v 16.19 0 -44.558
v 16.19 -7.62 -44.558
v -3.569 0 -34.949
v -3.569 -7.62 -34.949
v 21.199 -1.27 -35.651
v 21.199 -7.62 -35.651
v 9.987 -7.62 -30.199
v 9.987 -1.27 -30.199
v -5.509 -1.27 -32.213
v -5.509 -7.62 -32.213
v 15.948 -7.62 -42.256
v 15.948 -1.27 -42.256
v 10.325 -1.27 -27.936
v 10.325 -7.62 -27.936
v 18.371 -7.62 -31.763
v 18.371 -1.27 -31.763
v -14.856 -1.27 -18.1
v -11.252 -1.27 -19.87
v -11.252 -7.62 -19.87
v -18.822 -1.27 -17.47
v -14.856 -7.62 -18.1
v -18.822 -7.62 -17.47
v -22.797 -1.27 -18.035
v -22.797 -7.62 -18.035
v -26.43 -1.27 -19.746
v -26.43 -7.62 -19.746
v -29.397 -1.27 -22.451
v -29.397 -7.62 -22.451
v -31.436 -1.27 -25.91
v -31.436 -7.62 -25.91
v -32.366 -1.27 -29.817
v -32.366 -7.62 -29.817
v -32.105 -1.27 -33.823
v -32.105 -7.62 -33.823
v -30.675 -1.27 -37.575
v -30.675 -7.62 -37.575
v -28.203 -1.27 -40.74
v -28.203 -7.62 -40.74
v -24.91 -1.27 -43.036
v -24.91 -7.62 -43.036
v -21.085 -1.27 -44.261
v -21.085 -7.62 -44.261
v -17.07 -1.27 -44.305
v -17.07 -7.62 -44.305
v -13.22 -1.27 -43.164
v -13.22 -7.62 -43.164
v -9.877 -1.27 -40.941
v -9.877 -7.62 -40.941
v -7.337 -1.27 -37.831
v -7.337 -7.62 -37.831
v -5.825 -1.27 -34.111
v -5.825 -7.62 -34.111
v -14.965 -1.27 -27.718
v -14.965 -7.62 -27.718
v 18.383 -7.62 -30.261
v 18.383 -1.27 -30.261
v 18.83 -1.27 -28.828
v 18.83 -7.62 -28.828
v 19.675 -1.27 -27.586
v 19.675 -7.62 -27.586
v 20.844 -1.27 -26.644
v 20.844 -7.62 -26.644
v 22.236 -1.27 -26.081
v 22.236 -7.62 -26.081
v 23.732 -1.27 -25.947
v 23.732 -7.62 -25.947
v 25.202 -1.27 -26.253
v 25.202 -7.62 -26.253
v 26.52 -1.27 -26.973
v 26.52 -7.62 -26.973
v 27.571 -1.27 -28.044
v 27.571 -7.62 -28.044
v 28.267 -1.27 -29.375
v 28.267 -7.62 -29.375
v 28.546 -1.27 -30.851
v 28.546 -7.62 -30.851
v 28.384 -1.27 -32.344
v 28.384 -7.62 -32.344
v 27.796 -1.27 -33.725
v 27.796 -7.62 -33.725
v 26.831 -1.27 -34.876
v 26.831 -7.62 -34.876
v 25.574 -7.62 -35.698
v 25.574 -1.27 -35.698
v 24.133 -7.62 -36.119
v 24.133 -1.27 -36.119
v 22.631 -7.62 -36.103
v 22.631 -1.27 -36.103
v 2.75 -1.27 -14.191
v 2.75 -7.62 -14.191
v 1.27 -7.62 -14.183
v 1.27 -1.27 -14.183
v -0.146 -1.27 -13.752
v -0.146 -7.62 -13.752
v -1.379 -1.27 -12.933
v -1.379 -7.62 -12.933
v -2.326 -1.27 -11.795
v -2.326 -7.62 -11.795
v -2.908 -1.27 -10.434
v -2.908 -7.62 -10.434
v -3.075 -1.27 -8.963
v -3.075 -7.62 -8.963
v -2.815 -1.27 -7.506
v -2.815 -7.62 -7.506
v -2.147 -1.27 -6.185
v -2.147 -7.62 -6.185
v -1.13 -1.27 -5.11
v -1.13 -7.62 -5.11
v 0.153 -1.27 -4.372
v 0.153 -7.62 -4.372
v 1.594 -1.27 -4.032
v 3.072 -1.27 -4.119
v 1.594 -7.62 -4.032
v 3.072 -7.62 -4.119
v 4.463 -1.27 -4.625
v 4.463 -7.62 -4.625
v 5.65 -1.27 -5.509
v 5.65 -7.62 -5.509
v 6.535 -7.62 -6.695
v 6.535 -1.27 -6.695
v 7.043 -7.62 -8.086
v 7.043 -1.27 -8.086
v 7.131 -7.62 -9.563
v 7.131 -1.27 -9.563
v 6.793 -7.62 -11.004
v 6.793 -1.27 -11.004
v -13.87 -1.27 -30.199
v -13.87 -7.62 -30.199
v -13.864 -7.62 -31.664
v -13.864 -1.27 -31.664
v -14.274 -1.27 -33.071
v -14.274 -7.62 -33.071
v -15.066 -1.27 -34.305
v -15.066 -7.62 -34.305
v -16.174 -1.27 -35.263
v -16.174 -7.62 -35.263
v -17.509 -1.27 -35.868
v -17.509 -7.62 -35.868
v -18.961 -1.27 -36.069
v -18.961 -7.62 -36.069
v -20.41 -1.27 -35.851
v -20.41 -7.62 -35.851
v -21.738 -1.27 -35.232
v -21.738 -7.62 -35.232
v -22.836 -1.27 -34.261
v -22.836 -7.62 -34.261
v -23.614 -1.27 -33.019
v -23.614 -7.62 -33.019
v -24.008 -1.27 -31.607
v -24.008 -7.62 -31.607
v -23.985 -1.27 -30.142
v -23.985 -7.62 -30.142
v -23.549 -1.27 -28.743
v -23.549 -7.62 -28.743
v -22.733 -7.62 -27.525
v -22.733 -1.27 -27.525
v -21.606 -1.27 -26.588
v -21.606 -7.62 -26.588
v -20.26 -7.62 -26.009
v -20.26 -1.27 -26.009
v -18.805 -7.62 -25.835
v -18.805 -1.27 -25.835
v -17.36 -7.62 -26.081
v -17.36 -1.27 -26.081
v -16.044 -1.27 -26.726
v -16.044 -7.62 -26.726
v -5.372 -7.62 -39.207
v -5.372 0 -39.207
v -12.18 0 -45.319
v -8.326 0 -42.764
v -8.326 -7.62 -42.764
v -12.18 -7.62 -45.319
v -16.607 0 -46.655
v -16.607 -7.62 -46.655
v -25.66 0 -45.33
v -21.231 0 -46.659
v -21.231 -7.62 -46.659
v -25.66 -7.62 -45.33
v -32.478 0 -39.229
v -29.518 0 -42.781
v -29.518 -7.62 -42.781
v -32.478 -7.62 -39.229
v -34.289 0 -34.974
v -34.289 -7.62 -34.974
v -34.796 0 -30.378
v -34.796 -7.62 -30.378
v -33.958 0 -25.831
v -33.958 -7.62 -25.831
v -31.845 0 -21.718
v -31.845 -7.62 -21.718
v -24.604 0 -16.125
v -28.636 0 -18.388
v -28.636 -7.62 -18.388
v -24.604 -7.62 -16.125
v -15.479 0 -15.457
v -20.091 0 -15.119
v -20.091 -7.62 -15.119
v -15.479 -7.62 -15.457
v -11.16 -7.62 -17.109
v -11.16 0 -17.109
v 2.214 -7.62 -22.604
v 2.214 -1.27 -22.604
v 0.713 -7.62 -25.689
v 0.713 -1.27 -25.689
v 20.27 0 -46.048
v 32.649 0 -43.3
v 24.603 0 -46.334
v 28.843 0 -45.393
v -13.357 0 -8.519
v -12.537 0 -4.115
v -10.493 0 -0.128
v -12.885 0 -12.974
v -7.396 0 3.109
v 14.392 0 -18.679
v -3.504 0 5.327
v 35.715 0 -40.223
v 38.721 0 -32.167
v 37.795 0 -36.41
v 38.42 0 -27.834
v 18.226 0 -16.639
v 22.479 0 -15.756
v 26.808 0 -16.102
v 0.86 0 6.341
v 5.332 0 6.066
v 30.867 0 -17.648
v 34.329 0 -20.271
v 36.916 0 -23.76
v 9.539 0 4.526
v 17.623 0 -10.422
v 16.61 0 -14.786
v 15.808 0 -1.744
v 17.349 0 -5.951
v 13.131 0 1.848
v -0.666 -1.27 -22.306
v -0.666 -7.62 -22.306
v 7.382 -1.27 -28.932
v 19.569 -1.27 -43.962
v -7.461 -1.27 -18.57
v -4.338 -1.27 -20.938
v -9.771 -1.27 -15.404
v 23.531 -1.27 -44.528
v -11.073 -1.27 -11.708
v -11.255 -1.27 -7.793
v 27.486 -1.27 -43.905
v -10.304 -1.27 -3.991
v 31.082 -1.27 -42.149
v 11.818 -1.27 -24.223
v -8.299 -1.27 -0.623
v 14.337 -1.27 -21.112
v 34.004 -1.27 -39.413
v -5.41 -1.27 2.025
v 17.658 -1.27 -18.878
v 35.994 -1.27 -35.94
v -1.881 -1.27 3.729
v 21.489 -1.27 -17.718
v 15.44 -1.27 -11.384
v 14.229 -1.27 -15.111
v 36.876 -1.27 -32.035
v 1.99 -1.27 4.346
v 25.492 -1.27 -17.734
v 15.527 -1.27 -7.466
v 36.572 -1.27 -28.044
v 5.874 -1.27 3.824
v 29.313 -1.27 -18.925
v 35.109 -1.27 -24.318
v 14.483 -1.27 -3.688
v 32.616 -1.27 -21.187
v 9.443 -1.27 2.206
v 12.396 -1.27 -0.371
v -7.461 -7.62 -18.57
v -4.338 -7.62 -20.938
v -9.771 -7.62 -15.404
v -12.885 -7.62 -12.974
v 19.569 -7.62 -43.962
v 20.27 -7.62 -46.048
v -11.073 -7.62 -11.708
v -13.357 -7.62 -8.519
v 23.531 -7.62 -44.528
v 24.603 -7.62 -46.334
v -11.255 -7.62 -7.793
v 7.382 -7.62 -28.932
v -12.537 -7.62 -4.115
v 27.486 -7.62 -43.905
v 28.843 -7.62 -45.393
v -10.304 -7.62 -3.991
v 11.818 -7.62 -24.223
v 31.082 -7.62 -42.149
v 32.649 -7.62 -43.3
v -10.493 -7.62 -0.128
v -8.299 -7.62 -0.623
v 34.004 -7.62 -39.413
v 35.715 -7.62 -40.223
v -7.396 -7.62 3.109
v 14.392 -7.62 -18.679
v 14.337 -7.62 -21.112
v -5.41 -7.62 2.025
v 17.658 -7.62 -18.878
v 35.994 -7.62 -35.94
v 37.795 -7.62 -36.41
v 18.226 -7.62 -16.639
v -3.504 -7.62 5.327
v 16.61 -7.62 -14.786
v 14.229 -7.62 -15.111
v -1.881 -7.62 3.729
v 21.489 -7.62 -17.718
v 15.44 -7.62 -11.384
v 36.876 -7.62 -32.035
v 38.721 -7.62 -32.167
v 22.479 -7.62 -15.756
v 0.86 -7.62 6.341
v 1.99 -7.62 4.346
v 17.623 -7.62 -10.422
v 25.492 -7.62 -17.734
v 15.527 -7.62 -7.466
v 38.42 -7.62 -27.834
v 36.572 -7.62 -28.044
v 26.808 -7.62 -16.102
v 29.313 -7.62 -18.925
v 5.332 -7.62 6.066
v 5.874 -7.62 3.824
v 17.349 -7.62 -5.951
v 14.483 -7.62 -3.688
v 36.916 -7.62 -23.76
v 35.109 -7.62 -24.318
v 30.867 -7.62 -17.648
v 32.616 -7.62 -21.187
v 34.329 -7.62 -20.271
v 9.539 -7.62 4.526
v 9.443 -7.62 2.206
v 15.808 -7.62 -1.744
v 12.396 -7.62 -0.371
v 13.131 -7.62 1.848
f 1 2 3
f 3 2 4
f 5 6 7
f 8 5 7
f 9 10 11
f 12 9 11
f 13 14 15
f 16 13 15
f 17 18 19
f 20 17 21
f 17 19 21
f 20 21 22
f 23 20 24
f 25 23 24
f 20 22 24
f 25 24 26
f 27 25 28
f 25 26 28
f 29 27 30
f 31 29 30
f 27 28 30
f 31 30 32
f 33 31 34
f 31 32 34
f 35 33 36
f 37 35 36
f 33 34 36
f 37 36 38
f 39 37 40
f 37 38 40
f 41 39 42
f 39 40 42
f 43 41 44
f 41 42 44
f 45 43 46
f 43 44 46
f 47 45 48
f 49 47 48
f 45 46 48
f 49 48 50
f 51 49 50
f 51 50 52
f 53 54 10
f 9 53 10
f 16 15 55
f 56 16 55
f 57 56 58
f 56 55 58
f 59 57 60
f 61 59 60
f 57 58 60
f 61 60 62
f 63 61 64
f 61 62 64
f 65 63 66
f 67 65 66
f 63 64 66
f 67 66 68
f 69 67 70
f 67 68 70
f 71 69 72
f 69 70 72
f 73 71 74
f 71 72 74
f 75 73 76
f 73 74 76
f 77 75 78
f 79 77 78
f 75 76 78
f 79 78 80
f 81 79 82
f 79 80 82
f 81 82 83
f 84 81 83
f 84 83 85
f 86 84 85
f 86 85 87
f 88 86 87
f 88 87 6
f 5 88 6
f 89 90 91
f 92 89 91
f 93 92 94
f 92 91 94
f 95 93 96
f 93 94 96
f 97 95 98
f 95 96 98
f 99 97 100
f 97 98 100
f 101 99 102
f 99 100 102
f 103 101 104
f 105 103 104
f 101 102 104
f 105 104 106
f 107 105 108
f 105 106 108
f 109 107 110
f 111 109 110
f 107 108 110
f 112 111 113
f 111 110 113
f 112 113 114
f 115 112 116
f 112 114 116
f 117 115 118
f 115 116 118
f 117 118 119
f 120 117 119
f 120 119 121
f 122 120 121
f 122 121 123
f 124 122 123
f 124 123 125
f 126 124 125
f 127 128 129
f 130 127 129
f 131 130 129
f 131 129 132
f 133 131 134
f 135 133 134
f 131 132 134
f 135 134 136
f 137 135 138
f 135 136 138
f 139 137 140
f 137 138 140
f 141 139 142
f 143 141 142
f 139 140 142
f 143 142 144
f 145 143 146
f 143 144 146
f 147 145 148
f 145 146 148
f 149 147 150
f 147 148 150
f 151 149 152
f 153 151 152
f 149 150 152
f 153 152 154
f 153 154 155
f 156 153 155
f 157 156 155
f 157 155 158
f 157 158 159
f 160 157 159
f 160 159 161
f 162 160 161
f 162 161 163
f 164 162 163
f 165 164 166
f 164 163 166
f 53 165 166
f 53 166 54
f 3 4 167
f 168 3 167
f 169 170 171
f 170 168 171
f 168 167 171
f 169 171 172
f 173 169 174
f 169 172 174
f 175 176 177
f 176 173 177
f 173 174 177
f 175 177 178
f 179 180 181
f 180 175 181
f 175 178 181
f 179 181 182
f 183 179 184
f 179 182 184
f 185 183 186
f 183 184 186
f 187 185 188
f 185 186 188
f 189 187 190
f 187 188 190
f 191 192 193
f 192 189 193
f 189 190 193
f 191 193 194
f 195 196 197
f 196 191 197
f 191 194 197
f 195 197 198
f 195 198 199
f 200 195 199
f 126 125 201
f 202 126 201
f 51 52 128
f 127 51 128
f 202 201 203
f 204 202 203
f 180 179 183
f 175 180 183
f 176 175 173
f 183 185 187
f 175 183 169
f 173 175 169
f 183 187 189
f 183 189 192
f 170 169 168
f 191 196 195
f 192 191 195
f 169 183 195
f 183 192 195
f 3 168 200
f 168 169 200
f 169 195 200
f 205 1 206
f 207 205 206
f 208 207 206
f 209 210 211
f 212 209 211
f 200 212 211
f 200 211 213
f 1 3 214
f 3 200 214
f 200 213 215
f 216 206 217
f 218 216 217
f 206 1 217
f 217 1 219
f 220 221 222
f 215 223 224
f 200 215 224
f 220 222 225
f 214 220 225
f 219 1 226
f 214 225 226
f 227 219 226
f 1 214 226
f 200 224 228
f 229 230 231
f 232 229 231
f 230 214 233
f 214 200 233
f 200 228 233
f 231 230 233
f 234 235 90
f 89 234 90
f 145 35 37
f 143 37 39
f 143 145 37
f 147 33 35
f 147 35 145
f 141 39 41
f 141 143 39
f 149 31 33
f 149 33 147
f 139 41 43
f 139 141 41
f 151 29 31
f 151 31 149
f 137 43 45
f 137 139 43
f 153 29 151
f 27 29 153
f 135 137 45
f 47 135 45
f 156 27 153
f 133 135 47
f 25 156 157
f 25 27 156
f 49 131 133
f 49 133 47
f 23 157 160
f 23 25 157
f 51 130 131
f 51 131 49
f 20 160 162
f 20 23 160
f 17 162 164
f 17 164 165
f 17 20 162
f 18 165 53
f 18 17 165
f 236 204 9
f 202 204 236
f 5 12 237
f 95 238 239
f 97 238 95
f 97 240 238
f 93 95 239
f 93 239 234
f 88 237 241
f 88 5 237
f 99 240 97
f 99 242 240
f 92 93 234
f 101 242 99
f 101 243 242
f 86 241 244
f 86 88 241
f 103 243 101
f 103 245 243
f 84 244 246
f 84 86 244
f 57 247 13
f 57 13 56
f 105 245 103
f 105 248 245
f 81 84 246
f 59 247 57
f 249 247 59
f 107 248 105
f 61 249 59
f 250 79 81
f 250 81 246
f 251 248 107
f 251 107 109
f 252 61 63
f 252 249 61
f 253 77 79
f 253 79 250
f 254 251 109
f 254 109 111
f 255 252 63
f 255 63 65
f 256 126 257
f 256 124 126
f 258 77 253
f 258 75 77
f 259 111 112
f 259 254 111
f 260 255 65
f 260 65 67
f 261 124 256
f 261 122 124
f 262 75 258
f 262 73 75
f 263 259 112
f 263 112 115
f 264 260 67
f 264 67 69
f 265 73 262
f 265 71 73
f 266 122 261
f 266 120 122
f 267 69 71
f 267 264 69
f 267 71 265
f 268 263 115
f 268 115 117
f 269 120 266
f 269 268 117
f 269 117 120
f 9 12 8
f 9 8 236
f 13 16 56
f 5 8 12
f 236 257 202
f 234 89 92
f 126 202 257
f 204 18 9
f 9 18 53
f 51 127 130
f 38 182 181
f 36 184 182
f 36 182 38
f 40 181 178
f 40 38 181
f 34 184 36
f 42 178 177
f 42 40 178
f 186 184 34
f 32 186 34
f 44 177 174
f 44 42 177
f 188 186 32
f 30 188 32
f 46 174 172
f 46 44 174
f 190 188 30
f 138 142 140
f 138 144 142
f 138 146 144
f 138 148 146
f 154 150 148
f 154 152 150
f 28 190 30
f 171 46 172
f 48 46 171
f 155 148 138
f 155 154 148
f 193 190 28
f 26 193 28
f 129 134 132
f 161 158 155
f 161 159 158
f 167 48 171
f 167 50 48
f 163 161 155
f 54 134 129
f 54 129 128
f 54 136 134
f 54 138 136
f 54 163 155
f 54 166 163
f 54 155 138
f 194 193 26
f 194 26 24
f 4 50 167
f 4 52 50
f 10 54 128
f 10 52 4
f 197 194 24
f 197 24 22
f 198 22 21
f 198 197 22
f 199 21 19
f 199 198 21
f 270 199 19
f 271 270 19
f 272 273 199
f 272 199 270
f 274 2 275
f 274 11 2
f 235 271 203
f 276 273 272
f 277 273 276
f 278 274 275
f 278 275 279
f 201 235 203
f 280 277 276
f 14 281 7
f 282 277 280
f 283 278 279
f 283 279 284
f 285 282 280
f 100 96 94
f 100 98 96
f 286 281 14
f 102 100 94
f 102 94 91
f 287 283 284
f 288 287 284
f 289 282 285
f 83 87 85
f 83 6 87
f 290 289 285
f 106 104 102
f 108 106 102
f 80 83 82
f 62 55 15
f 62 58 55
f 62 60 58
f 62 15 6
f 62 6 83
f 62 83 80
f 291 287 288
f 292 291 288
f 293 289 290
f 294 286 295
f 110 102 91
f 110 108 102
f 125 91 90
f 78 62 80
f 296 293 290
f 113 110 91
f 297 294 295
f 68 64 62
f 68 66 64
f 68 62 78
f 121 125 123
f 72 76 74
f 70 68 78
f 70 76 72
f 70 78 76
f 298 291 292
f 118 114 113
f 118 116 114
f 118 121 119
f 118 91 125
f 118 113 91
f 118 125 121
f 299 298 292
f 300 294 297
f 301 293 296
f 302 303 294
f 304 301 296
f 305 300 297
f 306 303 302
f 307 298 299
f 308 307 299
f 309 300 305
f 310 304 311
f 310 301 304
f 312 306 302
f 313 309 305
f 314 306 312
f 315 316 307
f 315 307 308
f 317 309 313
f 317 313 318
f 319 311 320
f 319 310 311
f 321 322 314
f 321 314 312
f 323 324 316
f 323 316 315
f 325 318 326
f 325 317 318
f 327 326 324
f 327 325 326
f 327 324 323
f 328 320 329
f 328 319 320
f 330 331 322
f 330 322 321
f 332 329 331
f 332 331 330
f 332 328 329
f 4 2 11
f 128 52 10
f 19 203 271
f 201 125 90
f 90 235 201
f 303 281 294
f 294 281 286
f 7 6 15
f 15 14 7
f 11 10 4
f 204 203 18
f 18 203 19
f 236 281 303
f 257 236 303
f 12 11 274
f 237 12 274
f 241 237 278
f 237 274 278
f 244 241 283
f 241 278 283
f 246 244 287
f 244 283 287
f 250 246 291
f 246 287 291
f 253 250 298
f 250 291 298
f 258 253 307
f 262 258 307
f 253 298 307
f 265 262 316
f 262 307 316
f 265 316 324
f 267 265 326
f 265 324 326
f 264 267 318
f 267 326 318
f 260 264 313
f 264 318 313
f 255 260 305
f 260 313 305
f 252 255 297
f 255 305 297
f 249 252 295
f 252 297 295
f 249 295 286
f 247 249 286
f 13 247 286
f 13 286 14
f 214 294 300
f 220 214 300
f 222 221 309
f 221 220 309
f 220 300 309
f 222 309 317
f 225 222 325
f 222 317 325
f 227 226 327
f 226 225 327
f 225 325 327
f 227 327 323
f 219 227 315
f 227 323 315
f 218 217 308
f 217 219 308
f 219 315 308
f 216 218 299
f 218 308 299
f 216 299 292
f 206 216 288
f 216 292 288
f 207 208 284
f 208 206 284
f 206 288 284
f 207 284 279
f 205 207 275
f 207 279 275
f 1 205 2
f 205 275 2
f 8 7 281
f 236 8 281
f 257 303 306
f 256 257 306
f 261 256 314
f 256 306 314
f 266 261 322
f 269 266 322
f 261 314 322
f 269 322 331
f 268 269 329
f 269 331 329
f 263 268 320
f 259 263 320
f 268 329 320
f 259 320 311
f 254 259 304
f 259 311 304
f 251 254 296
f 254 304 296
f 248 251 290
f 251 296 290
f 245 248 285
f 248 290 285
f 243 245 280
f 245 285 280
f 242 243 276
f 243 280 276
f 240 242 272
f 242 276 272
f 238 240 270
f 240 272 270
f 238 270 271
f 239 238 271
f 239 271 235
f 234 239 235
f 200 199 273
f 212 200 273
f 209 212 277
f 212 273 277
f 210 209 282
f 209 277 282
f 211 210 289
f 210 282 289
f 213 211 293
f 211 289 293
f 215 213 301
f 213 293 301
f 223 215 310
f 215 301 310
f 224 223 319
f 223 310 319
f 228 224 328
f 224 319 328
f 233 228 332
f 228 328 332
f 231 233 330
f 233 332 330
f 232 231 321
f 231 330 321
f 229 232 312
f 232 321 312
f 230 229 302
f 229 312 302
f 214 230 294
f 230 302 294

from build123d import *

# Parameters (mm, degrees)
F0_W     = 76.2
F0_H     = 76.2
F1_DEPTH = 7.62
F3_DEPTH = 6.35
F4_W     = 76.2
F4_H     = 76.2
F5_DEPTH = 25.4


with BuildPart() as f1:
    # F0 (on Front) → F1 (new body)
    with BuildSketch(Plane.XZ):
        with Locations((1.97351, -18.584051)):
            Rectangle(F0_W, F0_H)
    extrude(amount=F1_DEPTH)

    # F2 (on face) → F3 (cut)
    with BuildSketch(Plane.XZ.offset(7.62)):
        with BuildLine():
            ThreePointArc((-13.869856, -30.198783), (-23.613724, -33.018671), (-14.965154, -27.718014))
            Line((-14.965154, -27.718014), (-5.508855, -32.213487))
            Line((-5.508855, -32.213487), (15.947649, -42.256406))
            ThreePointArc((15.947649, -42.256406), (35.979187, -26.126775), (10.324704, -27.936473))
            Line((10.324704, -27.936473), (18.371095, -31.763075))
            ThreePointArc((18.371095, -31.763075), (27.571492, -28.044193), (21.199014, -35.651355))
            Line((21.199014, -35.651355), (9.986617, -30.198783))
            Line((9.986617, -30.198783), (7.381885, -28.932106))
            Line((7.381885, -28.932106), (14.229408, -15.111173))
            ThreePointArc((14.229408, -15.111173), (-3.707419, 3.005858), (-0.665507, -22.30626))
            Line((-0.665507, -22.30626), (2.75023, -14.190622))
            ThreePointArc((2.75023, -14.190622), (-1.129552, -5.110009), (6.792904, -11.004492))
            Line((6.792904, -11.004492), (2.213593, -22.604426))
            Line((2.213593, -22.604426), (0.713445, -25.689254))
            Line((0.713445, -25.689254), (-11.252215, -19.870372))
            ThreePointArc((-11.252215, -19.870372), (-31.530362, -35.752906), (-5.825069, -34.110951))
            Line((-5.825069, -34.110951), (-13.869856, -30.198783))
        make_face()
    extrude(amount=-F3_DEPTH, mode=Mode.SUBTRACT)

    # F4 (on face) → F5 (cut)
    with BuildSketch(Plane.XZ.offset(7.62)):
        with Locations((1.97351, -18.584051)):
            Rectangle(F4_W, F4_H)
        with BuildLine():
            ThreePointArc((-11.160331, -17.109246), (3.105819, 6.365386), (14.391984, -18.678653))
            ThreePointArc((14.391984, -18.678653), (38.724881, -29.989974), (16.189961, -44.557514))
            Line((16.189961, -44.557514), (-3.568678, -34.948918))
            ThreePointArc((-3.568678, -34.948918), (-33.539138, -37.167669), (-11.160331, -17.109246))
        make_face(mode=Mode.SUBTRACT)
    extrude(amount=-F5_DEPTH, mode=Mode.SUBTRACT)


solid = f1.part
